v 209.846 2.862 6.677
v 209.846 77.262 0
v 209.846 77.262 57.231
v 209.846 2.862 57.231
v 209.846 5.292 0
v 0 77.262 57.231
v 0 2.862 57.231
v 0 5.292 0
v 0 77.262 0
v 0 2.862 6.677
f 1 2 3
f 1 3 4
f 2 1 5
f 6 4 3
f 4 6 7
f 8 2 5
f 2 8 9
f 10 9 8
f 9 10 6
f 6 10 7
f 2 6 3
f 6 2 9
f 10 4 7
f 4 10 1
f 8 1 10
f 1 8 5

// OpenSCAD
// file: defs.scad
LENGTH       = 220;
HEIGHT       = 83;
WIDTH        = 81;
RECESS       = 3; // 5 is too deep
CUP_DIAMETER = 62; // in mm

RATIO = CUP_DIAMETER / 65;
ATOM = 0.01;
// main file
include <defs.scad>

BODY_HEIGHT = 60;

module cavity() {
    translate([0, 0, -1])
    scale([10, 10, HEIGHT/100+1])
    linear_extrude(h=1)
    import("cavity.dxf");
}

module body() {
    translate([0, RECESS, 0])
    cube([LENGTH, WIDTH - RECESS, BODY_HEIGHT]);
}

module all() {
    difference() {
        body();

        cavity();

        translate([0, RECESS-ATOM, 0])
        rotate([90, 0, 0])
        logo();

        translate([0, RECESS, 7])
        rotate([20, 0, 0])
        translate([-LENGTH/2, -5, -7*2])
        cube([LENGTH*2, 5, 7*2]);
    }
}



module logo() {
    delta = .1/4;
    depth = 1.5;
    
    for (z=[0:delta:depth]) {
        translate([0, 0, -z])
        linear_extrude(delta+ATOM)
        offset(r=-z)
        import("logo-bbw.dxf");
    }
}



scale(RATIO) all();
